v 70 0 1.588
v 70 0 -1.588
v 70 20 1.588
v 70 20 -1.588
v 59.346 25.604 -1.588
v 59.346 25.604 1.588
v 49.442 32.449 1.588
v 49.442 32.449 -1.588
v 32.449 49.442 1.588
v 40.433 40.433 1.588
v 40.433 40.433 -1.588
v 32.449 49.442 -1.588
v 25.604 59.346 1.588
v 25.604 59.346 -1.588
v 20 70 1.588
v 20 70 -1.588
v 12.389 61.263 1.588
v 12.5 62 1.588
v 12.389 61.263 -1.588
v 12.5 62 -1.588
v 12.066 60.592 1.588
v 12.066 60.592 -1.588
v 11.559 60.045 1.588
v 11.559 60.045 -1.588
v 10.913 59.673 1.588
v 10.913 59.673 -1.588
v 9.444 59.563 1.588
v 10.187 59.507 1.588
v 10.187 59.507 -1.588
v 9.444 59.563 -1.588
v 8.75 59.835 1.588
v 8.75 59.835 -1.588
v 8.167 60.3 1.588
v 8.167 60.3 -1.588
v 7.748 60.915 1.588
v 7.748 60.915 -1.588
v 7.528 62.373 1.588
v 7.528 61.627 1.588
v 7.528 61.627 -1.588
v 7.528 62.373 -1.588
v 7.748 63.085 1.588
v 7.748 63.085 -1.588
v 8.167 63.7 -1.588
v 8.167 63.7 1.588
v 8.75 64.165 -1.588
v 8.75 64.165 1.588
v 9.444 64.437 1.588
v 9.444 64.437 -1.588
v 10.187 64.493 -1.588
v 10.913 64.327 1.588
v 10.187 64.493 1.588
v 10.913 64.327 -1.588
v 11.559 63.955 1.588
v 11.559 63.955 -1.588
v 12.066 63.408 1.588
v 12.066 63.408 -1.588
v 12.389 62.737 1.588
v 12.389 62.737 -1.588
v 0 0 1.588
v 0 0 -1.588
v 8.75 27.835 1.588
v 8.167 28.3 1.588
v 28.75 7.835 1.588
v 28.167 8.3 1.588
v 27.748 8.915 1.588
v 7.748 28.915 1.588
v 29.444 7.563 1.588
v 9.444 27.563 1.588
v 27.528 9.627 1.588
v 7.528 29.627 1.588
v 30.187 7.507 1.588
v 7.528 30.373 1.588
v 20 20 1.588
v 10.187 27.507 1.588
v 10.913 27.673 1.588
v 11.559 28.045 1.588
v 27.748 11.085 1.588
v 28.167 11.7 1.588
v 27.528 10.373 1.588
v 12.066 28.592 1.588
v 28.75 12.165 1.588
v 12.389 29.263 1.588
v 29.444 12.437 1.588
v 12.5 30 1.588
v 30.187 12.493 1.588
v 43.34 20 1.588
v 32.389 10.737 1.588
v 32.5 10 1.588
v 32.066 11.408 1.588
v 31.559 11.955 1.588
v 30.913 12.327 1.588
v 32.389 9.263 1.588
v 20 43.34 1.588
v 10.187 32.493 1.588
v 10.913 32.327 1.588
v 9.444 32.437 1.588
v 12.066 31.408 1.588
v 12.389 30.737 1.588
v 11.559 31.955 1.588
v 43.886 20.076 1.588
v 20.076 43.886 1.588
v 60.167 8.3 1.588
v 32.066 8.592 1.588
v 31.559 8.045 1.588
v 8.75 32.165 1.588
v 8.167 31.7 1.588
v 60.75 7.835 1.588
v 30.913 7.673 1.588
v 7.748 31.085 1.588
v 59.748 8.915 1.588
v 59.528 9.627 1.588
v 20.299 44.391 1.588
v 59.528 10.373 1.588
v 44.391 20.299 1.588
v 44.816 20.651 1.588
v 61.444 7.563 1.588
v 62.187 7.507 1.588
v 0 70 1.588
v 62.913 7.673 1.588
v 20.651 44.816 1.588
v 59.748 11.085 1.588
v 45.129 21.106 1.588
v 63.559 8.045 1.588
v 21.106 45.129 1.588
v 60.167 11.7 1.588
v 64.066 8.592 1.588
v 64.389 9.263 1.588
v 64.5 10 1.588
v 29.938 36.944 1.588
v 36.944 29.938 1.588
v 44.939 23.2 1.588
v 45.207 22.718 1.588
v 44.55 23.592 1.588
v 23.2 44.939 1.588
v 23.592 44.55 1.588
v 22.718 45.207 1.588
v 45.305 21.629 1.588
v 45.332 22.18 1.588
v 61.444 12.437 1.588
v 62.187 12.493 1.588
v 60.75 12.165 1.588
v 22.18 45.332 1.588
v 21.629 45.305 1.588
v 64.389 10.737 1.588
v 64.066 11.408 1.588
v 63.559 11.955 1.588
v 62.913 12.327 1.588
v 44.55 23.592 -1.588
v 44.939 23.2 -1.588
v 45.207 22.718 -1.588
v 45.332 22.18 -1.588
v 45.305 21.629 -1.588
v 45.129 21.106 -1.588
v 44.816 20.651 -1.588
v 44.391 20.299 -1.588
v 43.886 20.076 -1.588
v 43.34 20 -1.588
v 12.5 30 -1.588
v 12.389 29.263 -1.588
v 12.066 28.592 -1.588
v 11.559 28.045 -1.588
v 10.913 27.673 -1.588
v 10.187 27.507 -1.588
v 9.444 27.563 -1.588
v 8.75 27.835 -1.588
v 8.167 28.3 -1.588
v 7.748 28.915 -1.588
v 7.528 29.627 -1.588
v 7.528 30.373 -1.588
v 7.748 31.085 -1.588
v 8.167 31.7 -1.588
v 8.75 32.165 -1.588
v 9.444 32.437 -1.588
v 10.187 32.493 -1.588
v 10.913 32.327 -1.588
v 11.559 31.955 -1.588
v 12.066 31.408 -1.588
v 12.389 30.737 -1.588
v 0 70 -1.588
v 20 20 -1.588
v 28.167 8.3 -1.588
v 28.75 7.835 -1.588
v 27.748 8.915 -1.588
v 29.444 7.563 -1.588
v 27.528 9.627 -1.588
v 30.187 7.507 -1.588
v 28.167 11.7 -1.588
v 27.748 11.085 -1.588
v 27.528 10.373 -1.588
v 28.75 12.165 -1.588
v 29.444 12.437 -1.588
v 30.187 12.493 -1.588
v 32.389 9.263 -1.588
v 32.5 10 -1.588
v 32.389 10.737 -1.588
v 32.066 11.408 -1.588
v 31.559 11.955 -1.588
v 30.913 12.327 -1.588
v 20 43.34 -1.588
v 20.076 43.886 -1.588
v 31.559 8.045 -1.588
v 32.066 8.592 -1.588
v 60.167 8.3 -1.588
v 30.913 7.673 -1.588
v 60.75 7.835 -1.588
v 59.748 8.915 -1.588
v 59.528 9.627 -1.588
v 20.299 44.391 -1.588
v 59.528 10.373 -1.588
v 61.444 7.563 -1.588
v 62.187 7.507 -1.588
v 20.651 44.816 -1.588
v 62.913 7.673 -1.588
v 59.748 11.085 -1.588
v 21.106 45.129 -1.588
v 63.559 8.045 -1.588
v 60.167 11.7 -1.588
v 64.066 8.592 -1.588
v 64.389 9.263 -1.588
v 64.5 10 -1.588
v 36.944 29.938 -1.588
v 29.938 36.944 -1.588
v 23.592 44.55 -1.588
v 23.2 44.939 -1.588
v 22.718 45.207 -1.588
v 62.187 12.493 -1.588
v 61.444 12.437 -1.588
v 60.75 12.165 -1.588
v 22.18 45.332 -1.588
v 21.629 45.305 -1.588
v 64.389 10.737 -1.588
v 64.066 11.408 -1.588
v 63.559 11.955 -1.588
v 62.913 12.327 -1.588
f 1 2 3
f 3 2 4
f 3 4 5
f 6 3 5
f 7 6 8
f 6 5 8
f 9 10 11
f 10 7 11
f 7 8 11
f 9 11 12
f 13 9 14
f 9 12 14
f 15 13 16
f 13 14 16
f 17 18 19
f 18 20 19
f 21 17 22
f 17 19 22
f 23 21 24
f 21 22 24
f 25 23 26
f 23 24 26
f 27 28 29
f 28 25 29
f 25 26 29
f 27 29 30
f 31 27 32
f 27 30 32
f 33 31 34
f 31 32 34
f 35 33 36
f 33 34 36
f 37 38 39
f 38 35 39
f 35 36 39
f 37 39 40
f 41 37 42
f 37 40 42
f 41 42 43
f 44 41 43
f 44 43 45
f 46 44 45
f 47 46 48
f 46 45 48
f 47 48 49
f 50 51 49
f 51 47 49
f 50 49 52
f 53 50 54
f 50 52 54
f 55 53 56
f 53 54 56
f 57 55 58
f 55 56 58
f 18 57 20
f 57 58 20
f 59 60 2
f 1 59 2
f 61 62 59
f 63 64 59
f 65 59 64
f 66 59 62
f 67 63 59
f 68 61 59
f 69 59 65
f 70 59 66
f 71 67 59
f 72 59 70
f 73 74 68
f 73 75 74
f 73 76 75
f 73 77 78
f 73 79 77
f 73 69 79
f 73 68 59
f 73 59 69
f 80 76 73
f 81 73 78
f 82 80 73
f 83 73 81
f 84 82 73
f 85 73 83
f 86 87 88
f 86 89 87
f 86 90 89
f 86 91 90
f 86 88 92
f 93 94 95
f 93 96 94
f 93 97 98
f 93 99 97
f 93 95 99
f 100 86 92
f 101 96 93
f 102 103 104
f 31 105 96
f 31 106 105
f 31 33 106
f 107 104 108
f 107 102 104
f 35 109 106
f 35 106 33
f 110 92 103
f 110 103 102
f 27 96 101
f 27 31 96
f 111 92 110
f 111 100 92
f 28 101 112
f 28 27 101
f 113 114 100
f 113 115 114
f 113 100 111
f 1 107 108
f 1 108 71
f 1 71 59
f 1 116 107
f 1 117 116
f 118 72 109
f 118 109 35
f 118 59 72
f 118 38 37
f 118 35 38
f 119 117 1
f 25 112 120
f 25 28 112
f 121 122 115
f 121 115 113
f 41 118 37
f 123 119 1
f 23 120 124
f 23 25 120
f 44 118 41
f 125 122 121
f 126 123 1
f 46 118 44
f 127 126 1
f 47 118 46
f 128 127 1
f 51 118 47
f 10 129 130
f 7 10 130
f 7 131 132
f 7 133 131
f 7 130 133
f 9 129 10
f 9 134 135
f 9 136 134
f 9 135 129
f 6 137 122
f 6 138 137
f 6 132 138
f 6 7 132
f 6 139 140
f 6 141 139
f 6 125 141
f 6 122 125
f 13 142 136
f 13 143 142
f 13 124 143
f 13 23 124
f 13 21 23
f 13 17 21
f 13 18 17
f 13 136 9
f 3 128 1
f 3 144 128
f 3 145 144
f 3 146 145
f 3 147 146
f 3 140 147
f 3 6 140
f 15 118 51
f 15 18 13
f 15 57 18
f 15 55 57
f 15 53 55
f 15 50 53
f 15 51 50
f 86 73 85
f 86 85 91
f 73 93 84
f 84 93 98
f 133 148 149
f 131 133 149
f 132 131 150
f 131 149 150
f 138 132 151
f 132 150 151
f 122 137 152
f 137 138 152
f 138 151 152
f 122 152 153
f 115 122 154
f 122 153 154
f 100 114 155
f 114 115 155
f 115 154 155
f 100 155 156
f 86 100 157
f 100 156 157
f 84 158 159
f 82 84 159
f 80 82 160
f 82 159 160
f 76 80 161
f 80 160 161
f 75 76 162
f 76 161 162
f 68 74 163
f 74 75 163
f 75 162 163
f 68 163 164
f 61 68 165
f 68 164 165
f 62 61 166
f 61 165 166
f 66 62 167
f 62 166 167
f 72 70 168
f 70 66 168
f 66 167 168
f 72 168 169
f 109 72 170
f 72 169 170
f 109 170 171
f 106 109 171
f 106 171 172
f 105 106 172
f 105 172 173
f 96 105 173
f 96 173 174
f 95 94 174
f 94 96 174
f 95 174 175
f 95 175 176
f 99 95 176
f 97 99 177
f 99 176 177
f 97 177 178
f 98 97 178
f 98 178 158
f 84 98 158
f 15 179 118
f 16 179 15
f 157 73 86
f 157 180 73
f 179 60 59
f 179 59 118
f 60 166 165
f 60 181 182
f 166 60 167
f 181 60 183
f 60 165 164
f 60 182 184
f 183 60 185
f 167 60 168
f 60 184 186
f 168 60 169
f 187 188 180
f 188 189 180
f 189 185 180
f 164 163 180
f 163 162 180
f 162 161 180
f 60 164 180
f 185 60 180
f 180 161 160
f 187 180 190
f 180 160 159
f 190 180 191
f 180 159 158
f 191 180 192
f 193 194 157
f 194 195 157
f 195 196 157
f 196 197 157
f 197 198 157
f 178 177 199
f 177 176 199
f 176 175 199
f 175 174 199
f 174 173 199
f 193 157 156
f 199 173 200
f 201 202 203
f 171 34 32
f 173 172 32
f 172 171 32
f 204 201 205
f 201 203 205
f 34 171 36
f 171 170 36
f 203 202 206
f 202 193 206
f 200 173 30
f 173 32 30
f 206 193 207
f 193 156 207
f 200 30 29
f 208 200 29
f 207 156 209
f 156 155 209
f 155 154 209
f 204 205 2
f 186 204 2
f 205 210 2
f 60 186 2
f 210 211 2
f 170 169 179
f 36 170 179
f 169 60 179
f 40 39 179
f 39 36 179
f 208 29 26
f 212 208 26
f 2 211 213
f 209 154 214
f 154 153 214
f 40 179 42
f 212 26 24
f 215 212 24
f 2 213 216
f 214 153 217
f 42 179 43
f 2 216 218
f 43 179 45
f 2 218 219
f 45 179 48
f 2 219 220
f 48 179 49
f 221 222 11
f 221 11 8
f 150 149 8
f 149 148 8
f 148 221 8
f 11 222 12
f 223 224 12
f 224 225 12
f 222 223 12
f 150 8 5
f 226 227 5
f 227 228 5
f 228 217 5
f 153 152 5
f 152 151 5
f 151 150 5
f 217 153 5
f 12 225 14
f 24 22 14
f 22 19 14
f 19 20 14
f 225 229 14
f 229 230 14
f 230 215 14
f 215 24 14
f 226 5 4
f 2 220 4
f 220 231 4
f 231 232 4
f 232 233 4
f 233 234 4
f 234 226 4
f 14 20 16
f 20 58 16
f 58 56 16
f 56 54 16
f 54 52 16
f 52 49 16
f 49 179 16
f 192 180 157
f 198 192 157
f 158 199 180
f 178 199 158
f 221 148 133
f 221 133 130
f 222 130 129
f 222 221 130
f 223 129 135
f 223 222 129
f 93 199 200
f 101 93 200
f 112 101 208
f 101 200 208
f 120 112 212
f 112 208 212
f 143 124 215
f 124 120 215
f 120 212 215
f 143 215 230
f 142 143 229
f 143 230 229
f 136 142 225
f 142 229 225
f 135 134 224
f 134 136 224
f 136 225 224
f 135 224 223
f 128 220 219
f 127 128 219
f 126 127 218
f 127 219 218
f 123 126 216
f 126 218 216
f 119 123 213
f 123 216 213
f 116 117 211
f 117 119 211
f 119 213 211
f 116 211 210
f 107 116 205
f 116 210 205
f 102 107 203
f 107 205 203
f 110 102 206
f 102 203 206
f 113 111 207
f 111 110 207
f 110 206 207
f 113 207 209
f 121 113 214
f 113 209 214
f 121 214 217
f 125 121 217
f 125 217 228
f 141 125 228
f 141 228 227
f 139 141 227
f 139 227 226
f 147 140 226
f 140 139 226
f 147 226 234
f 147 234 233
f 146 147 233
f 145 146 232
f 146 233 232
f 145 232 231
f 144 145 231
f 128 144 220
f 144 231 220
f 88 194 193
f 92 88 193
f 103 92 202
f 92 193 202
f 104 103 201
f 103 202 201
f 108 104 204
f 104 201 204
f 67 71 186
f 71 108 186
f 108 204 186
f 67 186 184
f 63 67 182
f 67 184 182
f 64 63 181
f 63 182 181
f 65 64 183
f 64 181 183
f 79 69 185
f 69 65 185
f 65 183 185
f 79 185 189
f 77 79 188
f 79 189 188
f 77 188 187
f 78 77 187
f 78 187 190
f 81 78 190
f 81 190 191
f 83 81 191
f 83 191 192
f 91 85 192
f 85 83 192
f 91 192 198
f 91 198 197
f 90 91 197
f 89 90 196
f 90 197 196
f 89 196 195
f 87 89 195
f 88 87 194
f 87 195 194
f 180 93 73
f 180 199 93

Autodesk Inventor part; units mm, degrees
ref_plane "YZ Plane" through (0, 0, 0) normal (1, 0, 0) x (0, 1, 0)
ref_plane "XZ Plane" through (0, 0, 0) normal (0, 1, 0) x (-1, 0, 0)
ref_plane "XY Plane" through (0, 0, 0) normal (0, 0, 1) x (1, 0, 0)
sketch "Sketch1" plane through (0, 0, 0) normal (0, 0, 1) x (1, 0, 0)
  line L0 (0, 0) -> (0, 70)
  line L1 (0, 70) -> (20, 70)
  line L2 (0, 0) -> (70, 0)
  line L3 (70, 0) -> (70, 20)
  arc A0 (20, 70) -> (70, 20) centre (111.1438, 111.1438) ccw
  arc A1 (23.5919, 44.5505) -> (44.5505, 23.5919) centre (111.1438, 111.1438) ccw
  line L4 (20, 43.3398) -> (20, 20)
  line L5 (20, 20) -> (43.3398, 20)
  arc A2 (23.5919, 44.5505) -> (20, 43.3398) centre (22, 43.3398) ccw
  arc A3 (43.3398, 20) -> (44.5505, 23.5919) centre (43.3398, 22) ccw
  line L6 (10, 62) -> (10, 30) construction
  line L7 (62, 10) -> (30, 10) construction
  circle A4 centre (10, 62) radius 2.5
  circle A5 centre (10, 30) radius 2.5
  circle A6 centre (30, 10) radius 2.5
  circle A7 centre (62, 10) radius 2.5
  point P0 (70, 10)
  point P1 (10, 70)
  dimension "d0" = 70
  dimension "d1" = 70
  dimension "d2" = 20
  dimension "d4" = 100
  dimension "d5" = 10
  dimension "d6" = 2
  dimension "d7" = 32
  dimension "d8" = 32
  dimension "d9" = 8
  dimension "d10" = 8
  dimension "d11" = 5
  dimension "d12" = 5
  dimension "d13" = 5
  dimension "d14" = 5
extrude "Extrusion1" add sketch "Sketch1" along normal mid plane 3.175
equation "\"d10\" = d9"
properties part number "Corner Bracket" material "Aluminum 6061"
